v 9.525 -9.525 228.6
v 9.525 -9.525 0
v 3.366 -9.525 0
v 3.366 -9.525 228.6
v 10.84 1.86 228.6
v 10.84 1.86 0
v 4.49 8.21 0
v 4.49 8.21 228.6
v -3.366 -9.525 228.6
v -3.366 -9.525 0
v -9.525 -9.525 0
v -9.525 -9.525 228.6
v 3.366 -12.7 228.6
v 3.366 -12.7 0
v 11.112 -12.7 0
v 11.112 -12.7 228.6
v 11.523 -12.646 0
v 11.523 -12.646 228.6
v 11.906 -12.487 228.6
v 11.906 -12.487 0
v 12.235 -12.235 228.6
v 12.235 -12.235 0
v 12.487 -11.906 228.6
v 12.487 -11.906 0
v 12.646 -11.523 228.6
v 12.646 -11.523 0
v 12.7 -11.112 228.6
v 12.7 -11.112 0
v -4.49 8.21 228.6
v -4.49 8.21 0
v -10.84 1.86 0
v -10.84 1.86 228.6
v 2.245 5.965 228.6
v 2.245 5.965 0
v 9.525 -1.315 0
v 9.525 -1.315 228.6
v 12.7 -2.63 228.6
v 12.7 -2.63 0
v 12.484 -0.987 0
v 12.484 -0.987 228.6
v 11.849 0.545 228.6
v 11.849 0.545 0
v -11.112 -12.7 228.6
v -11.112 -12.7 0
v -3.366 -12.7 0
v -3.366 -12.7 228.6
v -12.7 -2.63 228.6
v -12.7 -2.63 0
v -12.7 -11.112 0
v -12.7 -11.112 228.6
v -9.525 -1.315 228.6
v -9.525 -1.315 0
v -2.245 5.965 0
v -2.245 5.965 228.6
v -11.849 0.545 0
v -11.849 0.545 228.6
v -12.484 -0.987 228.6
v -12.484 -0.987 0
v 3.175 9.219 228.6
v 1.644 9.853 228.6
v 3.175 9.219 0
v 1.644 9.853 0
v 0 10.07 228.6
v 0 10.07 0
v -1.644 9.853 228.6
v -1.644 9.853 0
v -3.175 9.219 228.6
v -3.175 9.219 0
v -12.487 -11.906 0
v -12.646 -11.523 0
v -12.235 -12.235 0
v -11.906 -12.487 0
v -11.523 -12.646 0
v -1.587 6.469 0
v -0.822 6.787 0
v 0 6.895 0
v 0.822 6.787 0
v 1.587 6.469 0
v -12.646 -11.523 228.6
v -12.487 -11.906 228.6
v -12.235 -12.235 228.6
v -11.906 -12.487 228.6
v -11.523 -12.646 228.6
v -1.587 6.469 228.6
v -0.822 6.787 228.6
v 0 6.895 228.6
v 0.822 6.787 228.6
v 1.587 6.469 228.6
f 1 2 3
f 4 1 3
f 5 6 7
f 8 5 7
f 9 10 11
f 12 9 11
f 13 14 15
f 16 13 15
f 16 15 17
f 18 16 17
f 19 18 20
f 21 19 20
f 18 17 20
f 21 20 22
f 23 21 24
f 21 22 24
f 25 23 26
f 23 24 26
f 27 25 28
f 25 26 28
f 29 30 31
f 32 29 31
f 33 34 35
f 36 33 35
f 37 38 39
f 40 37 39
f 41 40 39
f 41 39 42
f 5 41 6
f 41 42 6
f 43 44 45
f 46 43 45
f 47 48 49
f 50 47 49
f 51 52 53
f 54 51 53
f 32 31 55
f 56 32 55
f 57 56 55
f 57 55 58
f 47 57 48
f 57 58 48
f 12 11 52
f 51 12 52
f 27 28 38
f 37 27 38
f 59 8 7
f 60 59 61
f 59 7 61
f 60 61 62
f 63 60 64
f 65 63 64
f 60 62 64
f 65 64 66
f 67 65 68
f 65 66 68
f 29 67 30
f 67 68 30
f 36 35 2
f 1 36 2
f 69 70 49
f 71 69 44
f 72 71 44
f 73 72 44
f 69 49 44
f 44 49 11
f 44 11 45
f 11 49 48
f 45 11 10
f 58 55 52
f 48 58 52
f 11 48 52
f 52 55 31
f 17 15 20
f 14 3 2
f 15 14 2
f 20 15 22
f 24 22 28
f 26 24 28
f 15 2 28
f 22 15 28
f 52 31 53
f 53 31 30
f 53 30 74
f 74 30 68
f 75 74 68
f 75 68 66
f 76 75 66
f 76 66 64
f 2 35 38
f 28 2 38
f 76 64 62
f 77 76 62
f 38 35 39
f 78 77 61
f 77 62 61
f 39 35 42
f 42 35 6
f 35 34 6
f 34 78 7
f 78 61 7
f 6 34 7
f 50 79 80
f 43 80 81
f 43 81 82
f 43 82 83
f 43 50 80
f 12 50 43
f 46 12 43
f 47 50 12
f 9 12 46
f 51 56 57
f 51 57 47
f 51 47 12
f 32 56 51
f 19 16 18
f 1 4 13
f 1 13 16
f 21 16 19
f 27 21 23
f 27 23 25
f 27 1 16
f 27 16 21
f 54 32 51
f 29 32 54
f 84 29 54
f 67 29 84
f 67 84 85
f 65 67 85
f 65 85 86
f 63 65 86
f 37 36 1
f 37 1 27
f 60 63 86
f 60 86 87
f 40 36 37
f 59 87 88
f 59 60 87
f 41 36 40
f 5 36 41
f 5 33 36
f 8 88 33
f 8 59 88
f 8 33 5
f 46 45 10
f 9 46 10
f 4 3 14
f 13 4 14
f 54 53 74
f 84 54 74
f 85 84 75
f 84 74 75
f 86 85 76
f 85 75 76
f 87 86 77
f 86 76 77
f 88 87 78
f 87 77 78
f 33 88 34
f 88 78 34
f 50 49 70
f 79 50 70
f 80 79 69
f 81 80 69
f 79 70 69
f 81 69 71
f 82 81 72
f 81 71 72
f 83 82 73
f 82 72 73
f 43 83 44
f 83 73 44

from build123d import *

# Parameters (mm, degrees)
F1_DEPTH = 228.6


with BuildPart() as f1:
    # F0 (on Top) → F1 (new body)
    with BuildSketch(Plane.XY):
        with BuildLine():
            ThreePointArc((-12.7, -11.1125), (-12.235032, -12.235032), (-11.1125, -12.7))
            Line((-11.1125, -12.7), (-3.3655, -12.7))
            Line((-3.3655, -12.7), (-3.3655, -9.525))
            Line((-3.3655, -9.525), (-9.525, -9.525))
            Line((-9.525, -9.525), (-9.525, -1.315128))
            Line((-9.525, -1.315128), (-2.245064, 5.964808))
            ThreePointArc((-2.245064, 5.964808), (0, 6.894744), (2.245064, 5.964808))
            Line((2.245064, 5.964808), (9.525, -1.315128))
            Line((9.525, -1.315128), (9.525, -9.525))
            Line((9.525, -9.525), (3.3655, -9.525))
            Line((3.3655, -9.525), (3.3655, -12.7))
            Line((3.3655, -12.7), (11.1125, -12.7))
            ThreePointArc((11.1125, -12.7), (12.235032, -12.235032), (12.7, -11.1125))
            Line((12.7, -11.1125), (12.7, -2.630256))
            ThreePointArc((12.7, -2.630256), (12.216635, -0.200216), (10.840128, 1.859872))
            Line((10.840128, 1.859872), (4.490128, 8.209872))
            ThreePointArc((4.490128, 8.209872), (0, 10.069744), (-4.490128, 8.209872))
            Line((-4.490128, 8.209872), (-10.840128, 1.859872))
            ThreePointArc((-10.840128, 1.859872), (-12.216635, -0.200216), (-12.7, -2.630256))
            Line((-12.7, -2.630256), (-12.7, -11.1125))
        make_face()
    extrude(amount=F1_DEPTH)


solid = f1.part
